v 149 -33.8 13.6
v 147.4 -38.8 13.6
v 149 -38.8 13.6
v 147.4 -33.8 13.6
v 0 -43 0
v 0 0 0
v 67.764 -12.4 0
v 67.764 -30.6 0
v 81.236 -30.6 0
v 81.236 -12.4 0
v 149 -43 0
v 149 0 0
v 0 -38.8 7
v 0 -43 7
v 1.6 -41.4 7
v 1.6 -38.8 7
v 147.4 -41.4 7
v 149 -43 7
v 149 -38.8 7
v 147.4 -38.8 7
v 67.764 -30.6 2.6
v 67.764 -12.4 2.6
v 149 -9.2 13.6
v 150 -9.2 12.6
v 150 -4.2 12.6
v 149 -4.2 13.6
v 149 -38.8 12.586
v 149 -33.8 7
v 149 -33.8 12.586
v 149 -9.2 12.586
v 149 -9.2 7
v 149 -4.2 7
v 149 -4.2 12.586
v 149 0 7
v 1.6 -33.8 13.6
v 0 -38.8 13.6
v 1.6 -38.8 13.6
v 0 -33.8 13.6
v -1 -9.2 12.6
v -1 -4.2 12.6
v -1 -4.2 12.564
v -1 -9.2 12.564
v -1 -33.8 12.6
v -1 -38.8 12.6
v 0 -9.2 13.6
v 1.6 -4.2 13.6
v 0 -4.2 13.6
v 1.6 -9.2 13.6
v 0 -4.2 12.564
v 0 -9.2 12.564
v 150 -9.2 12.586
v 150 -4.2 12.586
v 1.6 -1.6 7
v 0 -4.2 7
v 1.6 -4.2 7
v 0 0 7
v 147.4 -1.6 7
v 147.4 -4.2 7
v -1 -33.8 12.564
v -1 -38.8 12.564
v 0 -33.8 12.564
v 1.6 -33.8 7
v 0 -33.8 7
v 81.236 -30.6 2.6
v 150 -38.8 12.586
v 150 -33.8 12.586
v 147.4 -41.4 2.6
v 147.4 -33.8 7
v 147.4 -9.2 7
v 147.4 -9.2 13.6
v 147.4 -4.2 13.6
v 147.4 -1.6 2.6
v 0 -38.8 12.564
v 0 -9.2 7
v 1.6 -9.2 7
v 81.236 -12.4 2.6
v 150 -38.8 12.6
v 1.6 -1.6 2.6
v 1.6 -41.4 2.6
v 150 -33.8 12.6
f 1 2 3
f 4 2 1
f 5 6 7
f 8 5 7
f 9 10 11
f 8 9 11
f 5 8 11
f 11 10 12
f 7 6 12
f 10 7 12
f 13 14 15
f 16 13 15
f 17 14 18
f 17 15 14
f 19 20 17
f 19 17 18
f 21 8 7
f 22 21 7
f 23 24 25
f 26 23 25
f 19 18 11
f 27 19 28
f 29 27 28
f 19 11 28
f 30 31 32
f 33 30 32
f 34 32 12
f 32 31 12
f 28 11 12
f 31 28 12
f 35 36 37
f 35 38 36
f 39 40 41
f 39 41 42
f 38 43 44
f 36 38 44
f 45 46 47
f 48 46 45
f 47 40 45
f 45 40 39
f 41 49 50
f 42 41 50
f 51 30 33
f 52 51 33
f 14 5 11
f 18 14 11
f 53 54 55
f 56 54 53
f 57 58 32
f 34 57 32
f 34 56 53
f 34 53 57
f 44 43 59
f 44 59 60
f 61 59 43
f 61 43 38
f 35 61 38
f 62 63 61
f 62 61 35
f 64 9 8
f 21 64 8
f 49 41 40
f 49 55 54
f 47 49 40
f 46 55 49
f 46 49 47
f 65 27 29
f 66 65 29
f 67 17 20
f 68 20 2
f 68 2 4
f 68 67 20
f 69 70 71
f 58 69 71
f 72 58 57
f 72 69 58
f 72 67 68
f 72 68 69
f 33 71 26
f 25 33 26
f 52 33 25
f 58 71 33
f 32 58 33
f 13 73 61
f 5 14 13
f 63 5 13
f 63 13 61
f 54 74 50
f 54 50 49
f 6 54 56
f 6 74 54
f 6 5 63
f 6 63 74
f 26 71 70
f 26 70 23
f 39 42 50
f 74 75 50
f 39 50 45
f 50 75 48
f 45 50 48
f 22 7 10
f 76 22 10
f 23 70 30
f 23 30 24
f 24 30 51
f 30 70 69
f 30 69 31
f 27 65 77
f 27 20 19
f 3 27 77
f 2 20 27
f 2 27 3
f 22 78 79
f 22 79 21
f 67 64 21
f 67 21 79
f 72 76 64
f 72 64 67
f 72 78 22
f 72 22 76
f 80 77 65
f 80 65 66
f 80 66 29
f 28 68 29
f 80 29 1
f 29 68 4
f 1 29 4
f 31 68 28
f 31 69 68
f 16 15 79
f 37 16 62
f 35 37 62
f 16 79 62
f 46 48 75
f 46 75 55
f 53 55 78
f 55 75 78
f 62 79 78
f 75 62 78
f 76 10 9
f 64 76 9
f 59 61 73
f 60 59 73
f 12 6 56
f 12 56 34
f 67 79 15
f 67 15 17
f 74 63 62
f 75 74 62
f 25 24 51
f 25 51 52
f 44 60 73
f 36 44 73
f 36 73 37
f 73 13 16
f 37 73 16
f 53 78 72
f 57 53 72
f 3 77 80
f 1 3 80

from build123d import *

# Parameters (mm, degrees)
F0_W      = 149
F0_H      = 43
F1_DEPTH  = 7
F2_T      = -1.6
F3_DEPTH  = 1
F4_W      = 1.6
F4_H      = 5
F5_DEPTH  = 6.6
F6_W      = 5
F6_H      = 1.0360542744
F7_DEPTH  = 1
F8_SIZE   = 1
F9_W      = 5
F9_H      = 1.0135311693
F10_DEPTH = 1
F11_SIZE  = 1
F12_W     = 6.7361369729
F12_H     = 9.1
F13_DEPTH = 25


with BuildPart() as f1:
    # F0 (on Top) → F1 (new body)
    with BuildSketch(Plane.XY):
        with Locations((74.5, -21.5)):
            Rectangle(F0_W, F0_H)
    extrude(amount=F1_DEPTH)

    # F2
    f2_openings = [f1.faces().sort_by_distance(p)[0] for p in [
        (74.5, -21.5, 7),
    ]]
    offset(amount=F2_T, openings=f2_openings)

    # F3 (add): a face of the model
    f3_faces = [f1.faces().sort_by_distance(p)[0] for p in [
        (74.5, -21.5, 1.6),
    ]]
    extrude(f3_faces, amount=F3_DEPTH)

    # F4 (on face) → F5 (join)
    with BuildSketch(Plane.XY.offset(7)):
        with Locations((0.8, -6.7)):
            Rectangle(F4_W, F4_H)
        with Locations((0.8, -36.3)):
            Rectangle(F4_W, F4_H)
        with Locations((148.2, -6.7)):
            Rectangle(F4_W, F4_H)
        with Locations((148.2, -36.3)):
            Rectangle(F4_W, F4_H)
    extrude(amount=F5_DEPTH)

    # F6 (on face) → F7 (join)
    with BuildSketch(Plane(origin=(0, 0, 0), x_dir=(0, -1, 0), z_dir=(-1, 0, 0))):
        with Locations((6.7, 13.0819728628)):
            Rectangle(F6_W, F6_H)
        with Locations((36.3, 13.0819728628)):
            Rectangle(F6_W, F6_H)
    extrude(amount=F7_DEPTH)

    # F8
    f8_edges = [f1.edges().sort_by_distance(p)[0] for p in [
        (-1, -6.7, 13.6),
        (-1, -36.3, 13.6),
    ]]
    chamfer(f8_edges, length=F8_SIZE)

    # F9 (on face) → F10 (join)
    with BuildSketch(Plane.YZ.offset(149)):
        with Locations((-36.3, 13.0932344154)):
            Rectangle(F9_W, F9_H)
        with Locations((-6.7, 13.0932344154)):
            Rectangle(F9_W, F9_H)
    extrude(amount=F10_DEPTH)

    # F11
    f11_edges = [f1.edges().sort_by_distance(p)[0] for p in [
        (150, -36.3, 13.6),
        (150, -6.7, 13.6),
    ]]
    chamfer(f11_edges, length=F11_SIZE)

    # F12 (on face) → F13 (cut)
    with BuildSketch(Plane(origin=(0, 0, 0), x_dir=(1, 0, 0), z_dir=(0, 0, -1))):
        with Locations((77.8680684865, 26.05)):
            Rectangle(F12_W, F12_H)
        with Locations((71.1319315135, 26.05)):
            Rectangle(F12_W, F12_H)
        with Locations((77.8680684865, 16.95)):
            Rectangle(F12_W, F12_H)
        with Locations((71.1319315135, 16.95)):
            Rectangle(F12_W, F12_H)
    extrude(amount=-F13_DEPTH, mode=Mode.SUBTRACT)


solid = f1.part
